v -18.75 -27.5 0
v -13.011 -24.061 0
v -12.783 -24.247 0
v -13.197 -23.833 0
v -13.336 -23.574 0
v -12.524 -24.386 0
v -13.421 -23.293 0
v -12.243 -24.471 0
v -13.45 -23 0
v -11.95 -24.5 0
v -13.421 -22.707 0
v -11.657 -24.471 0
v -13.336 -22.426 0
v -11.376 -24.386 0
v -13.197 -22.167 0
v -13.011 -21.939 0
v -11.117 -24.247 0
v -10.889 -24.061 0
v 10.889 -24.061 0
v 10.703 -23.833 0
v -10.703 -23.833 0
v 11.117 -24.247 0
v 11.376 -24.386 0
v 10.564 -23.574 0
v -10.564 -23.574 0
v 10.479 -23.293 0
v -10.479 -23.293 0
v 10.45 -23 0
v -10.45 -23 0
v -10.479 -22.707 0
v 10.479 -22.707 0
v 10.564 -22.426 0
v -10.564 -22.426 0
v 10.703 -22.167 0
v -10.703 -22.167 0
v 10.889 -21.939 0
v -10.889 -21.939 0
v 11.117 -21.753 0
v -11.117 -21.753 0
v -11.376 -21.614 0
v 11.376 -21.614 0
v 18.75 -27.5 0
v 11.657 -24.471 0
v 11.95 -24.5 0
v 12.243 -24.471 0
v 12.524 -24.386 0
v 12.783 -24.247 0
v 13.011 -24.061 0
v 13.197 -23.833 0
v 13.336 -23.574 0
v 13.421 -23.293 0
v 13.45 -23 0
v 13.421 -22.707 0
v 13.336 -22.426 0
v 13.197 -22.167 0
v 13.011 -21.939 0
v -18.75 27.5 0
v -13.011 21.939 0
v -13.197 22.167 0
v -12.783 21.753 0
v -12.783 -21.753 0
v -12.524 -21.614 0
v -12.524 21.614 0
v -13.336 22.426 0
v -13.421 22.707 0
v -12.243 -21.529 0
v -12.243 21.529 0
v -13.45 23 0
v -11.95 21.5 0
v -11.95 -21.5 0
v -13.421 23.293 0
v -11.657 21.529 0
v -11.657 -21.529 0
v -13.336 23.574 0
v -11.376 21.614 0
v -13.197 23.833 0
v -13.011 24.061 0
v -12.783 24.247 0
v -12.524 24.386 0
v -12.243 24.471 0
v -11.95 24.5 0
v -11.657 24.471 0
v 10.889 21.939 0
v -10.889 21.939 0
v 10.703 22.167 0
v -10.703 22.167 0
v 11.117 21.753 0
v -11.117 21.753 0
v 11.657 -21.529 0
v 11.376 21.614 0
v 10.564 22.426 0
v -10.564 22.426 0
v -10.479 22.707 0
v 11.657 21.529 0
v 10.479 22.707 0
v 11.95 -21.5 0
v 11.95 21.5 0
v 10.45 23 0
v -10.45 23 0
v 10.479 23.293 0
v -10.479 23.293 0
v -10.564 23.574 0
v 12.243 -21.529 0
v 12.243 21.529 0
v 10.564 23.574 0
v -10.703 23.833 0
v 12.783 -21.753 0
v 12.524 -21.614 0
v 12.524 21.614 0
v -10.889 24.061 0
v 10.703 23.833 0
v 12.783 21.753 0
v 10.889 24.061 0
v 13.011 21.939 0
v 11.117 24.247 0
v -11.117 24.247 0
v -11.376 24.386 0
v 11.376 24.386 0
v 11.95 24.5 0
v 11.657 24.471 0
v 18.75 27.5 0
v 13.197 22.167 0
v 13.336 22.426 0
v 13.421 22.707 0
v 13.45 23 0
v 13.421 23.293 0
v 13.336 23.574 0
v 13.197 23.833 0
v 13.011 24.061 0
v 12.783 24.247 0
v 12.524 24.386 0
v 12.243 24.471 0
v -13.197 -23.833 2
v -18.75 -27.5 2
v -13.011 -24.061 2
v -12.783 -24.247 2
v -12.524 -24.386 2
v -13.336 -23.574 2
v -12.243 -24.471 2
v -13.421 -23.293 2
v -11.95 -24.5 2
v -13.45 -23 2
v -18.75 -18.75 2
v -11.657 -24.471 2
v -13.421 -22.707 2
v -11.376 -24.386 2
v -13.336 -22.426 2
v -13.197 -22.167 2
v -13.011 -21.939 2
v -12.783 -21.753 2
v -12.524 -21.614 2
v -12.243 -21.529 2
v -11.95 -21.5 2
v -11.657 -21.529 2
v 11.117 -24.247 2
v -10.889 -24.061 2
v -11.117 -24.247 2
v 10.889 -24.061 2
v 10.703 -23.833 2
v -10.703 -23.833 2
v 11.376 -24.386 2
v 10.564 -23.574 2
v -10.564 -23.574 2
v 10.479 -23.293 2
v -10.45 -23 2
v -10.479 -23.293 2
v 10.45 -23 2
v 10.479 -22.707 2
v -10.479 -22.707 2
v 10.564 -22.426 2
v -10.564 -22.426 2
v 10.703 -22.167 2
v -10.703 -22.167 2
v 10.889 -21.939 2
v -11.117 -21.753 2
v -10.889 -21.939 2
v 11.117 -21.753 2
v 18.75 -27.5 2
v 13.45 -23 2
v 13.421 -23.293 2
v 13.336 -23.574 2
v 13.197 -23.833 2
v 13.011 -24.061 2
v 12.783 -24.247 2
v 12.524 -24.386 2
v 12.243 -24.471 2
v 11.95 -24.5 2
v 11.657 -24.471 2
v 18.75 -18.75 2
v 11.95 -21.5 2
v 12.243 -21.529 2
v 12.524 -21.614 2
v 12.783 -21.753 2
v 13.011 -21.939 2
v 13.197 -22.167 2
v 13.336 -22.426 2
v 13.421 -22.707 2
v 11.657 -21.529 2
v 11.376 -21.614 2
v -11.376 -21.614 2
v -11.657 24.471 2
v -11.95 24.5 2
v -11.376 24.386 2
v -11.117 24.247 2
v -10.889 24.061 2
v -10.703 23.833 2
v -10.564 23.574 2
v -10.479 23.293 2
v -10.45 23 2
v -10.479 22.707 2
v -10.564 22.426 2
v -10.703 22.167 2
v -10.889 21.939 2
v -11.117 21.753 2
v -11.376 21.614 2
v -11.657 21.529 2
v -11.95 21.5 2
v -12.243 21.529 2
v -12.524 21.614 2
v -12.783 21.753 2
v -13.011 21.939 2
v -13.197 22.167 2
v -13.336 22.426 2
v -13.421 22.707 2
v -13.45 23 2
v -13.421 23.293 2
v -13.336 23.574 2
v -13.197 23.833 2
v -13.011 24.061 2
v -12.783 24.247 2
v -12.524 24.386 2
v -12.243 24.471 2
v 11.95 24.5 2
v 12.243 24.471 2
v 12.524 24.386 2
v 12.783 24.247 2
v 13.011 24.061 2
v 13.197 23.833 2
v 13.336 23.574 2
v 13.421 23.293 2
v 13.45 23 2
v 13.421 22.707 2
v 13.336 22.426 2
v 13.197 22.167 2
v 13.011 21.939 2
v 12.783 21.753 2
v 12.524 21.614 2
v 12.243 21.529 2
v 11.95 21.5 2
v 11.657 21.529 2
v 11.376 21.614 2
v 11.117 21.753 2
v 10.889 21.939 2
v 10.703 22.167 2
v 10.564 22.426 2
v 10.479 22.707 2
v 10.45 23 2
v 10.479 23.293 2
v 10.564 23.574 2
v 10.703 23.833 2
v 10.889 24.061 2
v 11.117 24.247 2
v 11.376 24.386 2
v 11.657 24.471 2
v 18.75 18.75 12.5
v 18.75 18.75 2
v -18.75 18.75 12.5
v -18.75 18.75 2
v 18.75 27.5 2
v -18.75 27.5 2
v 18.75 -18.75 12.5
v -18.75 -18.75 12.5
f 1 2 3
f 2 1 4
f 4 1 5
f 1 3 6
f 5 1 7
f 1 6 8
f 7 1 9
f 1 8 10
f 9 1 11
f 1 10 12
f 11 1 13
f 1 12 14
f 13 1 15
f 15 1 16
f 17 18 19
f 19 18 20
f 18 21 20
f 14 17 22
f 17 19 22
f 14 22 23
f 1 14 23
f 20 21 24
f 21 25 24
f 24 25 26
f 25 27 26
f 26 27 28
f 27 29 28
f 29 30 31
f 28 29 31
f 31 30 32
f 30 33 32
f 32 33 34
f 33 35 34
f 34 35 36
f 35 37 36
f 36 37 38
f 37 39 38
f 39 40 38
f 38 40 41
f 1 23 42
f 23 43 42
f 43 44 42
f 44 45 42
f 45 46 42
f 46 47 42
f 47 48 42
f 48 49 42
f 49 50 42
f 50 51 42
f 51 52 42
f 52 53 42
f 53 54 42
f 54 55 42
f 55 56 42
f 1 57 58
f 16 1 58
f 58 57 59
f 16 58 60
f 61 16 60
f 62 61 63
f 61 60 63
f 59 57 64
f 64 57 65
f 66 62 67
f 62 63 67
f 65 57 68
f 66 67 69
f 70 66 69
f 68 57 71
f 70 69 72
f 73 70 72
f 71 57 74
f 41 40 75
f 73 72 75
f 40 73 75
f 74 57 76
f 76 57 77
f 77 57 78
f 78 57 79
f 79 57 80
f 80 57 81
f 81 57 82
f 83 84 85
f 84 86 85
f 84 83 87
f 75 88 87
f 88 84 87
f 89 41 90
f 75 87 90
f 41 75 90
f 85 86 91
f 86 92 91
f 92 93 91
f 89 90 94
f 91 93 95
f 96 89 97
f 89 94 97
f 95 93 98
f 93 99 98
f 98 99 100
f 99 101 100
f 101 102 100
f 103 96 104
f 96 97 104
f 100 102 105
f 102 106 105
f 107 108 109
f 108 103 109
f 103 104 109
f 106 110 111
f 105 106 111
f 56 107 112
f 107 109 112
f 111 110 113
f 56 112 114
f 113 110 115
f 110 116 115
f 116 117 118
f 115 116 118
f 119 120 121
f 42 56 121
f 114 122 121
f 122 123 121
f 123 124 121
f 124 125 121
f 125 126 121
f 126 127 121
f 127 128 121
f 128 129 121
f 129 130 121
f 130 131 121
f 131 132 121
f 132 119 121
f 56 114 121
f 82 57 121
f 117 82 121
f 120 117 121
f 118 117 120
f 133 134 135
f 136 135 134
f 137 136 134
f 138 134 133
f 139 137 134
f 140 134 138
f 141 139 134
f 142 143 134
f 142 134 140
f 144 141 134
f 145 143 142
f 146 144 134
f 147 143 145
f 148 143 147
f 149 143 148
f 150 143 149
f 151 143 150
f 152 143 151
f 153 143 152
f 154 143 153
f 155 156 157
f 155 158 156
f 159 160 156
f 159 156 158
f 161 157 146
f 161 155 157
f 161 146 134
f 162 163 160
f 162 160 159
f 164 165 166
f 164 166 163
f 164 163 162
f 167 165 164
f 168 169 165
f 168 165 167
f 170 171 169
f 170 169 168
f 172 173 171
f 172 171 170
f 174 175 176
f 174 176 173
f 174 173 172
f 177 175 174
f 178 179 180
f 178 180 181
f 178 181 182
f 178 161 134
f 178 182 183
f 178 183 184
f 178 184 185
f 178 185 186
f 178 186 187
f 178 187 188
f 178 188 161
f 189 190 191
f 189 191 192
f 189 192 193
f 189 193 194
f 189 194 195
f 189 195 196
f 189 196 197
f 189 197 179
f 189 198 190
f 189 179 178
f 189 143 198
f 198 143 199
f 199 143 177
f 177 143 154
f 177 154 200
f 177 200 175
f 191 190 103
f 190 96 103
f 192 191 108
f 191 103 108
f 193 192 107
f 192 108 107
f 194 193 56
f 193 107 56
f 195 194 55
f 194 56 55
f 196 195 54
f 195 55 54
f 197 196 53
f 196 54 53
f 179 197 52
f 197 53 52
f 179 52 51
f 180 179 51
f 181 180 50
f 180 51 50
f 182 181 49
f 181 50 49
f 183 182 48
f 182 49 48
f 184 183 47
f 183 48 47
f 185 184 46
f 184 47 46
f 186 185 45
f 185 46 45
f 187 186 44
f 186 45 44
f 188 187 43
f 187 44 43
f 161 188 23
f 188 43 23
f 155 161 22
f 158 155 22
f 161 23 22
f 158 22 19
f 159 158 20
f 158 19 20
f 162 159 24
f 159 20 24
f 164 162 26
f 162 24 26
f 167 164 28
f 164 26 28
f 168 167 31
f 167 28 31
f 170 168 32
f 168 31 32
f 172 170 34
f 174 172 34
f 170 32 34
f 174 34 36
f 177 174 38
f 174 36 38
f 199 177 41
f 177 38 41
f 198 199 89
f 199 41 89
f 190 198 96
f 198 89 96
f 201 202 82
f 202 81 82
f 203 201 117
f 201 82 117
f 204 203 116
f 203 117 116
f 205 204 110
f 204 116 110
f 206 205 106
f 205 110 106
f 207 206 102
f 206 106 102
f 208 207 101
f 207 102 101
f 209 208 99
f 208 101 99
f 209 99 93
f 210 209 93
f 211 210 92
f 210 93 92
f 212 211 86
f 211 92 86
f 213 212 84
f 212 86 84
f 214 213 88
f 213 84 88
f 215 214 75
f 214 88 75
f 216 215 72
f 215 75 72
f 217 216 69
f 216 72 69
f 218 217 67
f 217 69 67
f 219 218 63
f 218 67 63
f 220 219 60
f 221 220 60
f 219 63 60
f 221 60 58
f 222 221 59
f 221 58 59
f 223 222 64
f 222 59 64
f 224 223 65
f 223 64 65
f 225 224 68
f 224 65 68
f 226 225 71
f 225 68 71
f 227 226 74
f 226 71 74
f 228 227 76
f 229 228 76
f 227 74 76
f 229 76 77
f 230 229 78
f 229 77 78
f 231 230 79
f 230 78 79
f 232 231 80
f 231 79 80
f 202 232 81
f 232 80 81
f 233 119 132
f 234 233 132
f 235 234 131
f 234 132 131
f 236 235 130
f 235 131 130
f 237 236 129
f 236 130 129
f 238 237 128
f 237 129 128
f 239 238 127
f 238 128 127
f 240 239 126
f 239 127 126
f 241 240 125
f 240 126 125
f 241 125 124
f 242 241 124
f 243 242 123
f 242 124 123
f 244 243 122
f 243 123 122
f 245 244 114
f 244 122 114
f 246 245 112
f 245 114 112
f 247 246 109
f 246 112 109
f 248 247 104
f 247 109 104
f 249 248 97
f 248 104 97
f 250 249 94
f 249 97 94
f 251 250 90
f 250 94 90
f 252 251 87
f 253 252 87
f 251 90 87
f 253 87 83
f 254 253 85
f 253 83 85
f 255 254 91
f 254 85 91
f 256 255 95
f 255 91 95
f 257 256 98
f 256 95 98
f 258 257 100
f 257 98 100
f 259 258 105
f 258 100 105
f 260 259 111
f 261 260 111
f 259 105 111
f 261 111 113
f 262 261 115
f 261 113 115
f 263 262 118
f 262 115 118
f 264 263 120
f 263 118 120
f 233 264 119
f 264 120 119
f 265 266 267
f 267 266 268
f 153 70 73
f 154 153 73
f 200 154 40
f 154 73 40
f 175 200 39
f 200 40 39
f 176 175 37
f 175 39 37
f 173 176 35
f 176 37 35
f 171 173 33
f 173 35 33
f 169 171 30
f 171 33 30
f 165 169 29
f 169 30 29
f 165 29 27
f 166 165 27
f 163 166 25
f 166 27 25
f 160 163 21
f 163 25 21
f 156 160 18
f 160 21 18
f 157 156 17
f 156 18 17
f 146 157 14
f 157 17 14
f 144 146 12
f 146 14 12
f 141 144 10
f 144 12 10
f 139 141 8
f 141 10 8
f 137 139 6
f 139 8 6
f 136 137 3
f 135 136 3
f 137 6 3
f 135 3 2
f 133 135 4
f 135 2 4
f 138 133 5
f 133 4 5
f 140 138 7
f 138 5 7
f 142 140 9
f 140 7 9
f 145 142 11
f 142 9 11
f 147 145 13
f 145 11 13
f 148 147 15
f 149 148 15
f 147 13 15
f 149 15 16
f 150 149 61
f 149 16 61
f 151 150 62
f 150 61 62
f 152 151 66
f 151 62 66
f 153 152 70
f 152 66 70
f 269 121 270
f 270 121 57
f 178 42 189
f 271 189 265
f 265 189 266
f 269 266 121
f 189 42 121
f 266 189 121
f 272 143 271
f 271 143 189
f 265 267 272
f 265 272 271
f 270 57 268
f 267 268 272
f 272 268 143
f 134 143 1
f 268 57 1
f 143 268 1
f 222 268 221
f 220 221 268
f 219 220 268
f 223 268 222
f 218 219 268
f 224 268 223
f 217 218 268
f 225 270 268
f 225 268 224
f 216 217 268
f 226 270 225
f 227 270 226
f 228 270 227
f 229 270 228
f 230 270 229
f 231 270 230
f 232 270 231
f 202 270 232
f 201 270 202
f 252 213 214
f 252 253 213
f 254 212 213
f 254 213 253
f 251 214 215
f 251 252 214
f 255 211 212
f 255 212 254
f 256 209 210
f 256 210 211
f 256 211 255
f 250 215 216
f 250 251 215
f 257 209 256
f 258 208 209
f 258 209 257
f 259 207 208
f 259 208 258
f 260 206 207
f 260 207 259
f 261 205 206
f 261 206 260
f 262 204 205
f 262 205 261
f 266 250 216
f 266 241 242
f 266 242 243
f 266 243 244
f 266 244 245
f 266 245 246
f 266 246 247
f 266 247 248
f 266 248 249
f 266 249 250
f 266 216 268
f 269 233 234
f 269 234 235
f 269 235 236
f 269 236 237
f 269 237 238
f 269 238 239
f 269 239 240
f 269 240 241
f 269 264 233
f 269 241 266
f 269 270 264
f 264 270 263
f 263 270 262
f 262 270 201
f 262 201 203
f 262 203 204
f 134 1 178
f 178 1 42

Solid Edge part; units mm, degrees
sketch "Sketch1" plane through (0, 0, 0) normal (0, 0, 1) x (1, 0, 0)
  line L0 (-18.75, -27.5) -> (18.75, -27.5)
  line L1 (18.75, -27.5) -> (18.75, 27.5)
  line L2 (18.75, 27.5) -> (-18.75, 27.5)
  line L3 (-18.75, 27.5) -> (-18.75, -27.5)
  dimension "D1" = 55
  dimension "D2" = 37.5
extrude "Protrusion1" add sketch "Sketch1" along normal blind 2
sketch "Sketch2" plane through (0, 0, 2) normal (0, 0, 1) x (1, 0, 0)
  line L0 (-18.75, -18.75) -> (18.75, -18.75)
  line L1 (18.75, -18.75) -> (18.75, 18.75)
  line L2 (18.75, 18.75) -> (-18.75, 18.75)
  line L3 (-18.75, 18.75) -> (-18.75, -18.75)
  dimension "D1" = 37.5
extrude "Extrusionsausprägung_2" add sketch "Sketch2" along normal blind 10.5
hole "Bohrung_1" at (-11.95, 23, 0) direction (0, 0, 1) diameter 3 end up to next
hole "Hole1" at (-11.95, -23, 0) direction (0, 0, 1) diameter 3 end up to next
hole "Hole2" at (11.95, -23, 0) direction (0, 0, 1) diameter 3 end up to next
hole "Hole3" at (11.95, 23, 0) direction (0, 0, 1) diameter 3 end up to next
